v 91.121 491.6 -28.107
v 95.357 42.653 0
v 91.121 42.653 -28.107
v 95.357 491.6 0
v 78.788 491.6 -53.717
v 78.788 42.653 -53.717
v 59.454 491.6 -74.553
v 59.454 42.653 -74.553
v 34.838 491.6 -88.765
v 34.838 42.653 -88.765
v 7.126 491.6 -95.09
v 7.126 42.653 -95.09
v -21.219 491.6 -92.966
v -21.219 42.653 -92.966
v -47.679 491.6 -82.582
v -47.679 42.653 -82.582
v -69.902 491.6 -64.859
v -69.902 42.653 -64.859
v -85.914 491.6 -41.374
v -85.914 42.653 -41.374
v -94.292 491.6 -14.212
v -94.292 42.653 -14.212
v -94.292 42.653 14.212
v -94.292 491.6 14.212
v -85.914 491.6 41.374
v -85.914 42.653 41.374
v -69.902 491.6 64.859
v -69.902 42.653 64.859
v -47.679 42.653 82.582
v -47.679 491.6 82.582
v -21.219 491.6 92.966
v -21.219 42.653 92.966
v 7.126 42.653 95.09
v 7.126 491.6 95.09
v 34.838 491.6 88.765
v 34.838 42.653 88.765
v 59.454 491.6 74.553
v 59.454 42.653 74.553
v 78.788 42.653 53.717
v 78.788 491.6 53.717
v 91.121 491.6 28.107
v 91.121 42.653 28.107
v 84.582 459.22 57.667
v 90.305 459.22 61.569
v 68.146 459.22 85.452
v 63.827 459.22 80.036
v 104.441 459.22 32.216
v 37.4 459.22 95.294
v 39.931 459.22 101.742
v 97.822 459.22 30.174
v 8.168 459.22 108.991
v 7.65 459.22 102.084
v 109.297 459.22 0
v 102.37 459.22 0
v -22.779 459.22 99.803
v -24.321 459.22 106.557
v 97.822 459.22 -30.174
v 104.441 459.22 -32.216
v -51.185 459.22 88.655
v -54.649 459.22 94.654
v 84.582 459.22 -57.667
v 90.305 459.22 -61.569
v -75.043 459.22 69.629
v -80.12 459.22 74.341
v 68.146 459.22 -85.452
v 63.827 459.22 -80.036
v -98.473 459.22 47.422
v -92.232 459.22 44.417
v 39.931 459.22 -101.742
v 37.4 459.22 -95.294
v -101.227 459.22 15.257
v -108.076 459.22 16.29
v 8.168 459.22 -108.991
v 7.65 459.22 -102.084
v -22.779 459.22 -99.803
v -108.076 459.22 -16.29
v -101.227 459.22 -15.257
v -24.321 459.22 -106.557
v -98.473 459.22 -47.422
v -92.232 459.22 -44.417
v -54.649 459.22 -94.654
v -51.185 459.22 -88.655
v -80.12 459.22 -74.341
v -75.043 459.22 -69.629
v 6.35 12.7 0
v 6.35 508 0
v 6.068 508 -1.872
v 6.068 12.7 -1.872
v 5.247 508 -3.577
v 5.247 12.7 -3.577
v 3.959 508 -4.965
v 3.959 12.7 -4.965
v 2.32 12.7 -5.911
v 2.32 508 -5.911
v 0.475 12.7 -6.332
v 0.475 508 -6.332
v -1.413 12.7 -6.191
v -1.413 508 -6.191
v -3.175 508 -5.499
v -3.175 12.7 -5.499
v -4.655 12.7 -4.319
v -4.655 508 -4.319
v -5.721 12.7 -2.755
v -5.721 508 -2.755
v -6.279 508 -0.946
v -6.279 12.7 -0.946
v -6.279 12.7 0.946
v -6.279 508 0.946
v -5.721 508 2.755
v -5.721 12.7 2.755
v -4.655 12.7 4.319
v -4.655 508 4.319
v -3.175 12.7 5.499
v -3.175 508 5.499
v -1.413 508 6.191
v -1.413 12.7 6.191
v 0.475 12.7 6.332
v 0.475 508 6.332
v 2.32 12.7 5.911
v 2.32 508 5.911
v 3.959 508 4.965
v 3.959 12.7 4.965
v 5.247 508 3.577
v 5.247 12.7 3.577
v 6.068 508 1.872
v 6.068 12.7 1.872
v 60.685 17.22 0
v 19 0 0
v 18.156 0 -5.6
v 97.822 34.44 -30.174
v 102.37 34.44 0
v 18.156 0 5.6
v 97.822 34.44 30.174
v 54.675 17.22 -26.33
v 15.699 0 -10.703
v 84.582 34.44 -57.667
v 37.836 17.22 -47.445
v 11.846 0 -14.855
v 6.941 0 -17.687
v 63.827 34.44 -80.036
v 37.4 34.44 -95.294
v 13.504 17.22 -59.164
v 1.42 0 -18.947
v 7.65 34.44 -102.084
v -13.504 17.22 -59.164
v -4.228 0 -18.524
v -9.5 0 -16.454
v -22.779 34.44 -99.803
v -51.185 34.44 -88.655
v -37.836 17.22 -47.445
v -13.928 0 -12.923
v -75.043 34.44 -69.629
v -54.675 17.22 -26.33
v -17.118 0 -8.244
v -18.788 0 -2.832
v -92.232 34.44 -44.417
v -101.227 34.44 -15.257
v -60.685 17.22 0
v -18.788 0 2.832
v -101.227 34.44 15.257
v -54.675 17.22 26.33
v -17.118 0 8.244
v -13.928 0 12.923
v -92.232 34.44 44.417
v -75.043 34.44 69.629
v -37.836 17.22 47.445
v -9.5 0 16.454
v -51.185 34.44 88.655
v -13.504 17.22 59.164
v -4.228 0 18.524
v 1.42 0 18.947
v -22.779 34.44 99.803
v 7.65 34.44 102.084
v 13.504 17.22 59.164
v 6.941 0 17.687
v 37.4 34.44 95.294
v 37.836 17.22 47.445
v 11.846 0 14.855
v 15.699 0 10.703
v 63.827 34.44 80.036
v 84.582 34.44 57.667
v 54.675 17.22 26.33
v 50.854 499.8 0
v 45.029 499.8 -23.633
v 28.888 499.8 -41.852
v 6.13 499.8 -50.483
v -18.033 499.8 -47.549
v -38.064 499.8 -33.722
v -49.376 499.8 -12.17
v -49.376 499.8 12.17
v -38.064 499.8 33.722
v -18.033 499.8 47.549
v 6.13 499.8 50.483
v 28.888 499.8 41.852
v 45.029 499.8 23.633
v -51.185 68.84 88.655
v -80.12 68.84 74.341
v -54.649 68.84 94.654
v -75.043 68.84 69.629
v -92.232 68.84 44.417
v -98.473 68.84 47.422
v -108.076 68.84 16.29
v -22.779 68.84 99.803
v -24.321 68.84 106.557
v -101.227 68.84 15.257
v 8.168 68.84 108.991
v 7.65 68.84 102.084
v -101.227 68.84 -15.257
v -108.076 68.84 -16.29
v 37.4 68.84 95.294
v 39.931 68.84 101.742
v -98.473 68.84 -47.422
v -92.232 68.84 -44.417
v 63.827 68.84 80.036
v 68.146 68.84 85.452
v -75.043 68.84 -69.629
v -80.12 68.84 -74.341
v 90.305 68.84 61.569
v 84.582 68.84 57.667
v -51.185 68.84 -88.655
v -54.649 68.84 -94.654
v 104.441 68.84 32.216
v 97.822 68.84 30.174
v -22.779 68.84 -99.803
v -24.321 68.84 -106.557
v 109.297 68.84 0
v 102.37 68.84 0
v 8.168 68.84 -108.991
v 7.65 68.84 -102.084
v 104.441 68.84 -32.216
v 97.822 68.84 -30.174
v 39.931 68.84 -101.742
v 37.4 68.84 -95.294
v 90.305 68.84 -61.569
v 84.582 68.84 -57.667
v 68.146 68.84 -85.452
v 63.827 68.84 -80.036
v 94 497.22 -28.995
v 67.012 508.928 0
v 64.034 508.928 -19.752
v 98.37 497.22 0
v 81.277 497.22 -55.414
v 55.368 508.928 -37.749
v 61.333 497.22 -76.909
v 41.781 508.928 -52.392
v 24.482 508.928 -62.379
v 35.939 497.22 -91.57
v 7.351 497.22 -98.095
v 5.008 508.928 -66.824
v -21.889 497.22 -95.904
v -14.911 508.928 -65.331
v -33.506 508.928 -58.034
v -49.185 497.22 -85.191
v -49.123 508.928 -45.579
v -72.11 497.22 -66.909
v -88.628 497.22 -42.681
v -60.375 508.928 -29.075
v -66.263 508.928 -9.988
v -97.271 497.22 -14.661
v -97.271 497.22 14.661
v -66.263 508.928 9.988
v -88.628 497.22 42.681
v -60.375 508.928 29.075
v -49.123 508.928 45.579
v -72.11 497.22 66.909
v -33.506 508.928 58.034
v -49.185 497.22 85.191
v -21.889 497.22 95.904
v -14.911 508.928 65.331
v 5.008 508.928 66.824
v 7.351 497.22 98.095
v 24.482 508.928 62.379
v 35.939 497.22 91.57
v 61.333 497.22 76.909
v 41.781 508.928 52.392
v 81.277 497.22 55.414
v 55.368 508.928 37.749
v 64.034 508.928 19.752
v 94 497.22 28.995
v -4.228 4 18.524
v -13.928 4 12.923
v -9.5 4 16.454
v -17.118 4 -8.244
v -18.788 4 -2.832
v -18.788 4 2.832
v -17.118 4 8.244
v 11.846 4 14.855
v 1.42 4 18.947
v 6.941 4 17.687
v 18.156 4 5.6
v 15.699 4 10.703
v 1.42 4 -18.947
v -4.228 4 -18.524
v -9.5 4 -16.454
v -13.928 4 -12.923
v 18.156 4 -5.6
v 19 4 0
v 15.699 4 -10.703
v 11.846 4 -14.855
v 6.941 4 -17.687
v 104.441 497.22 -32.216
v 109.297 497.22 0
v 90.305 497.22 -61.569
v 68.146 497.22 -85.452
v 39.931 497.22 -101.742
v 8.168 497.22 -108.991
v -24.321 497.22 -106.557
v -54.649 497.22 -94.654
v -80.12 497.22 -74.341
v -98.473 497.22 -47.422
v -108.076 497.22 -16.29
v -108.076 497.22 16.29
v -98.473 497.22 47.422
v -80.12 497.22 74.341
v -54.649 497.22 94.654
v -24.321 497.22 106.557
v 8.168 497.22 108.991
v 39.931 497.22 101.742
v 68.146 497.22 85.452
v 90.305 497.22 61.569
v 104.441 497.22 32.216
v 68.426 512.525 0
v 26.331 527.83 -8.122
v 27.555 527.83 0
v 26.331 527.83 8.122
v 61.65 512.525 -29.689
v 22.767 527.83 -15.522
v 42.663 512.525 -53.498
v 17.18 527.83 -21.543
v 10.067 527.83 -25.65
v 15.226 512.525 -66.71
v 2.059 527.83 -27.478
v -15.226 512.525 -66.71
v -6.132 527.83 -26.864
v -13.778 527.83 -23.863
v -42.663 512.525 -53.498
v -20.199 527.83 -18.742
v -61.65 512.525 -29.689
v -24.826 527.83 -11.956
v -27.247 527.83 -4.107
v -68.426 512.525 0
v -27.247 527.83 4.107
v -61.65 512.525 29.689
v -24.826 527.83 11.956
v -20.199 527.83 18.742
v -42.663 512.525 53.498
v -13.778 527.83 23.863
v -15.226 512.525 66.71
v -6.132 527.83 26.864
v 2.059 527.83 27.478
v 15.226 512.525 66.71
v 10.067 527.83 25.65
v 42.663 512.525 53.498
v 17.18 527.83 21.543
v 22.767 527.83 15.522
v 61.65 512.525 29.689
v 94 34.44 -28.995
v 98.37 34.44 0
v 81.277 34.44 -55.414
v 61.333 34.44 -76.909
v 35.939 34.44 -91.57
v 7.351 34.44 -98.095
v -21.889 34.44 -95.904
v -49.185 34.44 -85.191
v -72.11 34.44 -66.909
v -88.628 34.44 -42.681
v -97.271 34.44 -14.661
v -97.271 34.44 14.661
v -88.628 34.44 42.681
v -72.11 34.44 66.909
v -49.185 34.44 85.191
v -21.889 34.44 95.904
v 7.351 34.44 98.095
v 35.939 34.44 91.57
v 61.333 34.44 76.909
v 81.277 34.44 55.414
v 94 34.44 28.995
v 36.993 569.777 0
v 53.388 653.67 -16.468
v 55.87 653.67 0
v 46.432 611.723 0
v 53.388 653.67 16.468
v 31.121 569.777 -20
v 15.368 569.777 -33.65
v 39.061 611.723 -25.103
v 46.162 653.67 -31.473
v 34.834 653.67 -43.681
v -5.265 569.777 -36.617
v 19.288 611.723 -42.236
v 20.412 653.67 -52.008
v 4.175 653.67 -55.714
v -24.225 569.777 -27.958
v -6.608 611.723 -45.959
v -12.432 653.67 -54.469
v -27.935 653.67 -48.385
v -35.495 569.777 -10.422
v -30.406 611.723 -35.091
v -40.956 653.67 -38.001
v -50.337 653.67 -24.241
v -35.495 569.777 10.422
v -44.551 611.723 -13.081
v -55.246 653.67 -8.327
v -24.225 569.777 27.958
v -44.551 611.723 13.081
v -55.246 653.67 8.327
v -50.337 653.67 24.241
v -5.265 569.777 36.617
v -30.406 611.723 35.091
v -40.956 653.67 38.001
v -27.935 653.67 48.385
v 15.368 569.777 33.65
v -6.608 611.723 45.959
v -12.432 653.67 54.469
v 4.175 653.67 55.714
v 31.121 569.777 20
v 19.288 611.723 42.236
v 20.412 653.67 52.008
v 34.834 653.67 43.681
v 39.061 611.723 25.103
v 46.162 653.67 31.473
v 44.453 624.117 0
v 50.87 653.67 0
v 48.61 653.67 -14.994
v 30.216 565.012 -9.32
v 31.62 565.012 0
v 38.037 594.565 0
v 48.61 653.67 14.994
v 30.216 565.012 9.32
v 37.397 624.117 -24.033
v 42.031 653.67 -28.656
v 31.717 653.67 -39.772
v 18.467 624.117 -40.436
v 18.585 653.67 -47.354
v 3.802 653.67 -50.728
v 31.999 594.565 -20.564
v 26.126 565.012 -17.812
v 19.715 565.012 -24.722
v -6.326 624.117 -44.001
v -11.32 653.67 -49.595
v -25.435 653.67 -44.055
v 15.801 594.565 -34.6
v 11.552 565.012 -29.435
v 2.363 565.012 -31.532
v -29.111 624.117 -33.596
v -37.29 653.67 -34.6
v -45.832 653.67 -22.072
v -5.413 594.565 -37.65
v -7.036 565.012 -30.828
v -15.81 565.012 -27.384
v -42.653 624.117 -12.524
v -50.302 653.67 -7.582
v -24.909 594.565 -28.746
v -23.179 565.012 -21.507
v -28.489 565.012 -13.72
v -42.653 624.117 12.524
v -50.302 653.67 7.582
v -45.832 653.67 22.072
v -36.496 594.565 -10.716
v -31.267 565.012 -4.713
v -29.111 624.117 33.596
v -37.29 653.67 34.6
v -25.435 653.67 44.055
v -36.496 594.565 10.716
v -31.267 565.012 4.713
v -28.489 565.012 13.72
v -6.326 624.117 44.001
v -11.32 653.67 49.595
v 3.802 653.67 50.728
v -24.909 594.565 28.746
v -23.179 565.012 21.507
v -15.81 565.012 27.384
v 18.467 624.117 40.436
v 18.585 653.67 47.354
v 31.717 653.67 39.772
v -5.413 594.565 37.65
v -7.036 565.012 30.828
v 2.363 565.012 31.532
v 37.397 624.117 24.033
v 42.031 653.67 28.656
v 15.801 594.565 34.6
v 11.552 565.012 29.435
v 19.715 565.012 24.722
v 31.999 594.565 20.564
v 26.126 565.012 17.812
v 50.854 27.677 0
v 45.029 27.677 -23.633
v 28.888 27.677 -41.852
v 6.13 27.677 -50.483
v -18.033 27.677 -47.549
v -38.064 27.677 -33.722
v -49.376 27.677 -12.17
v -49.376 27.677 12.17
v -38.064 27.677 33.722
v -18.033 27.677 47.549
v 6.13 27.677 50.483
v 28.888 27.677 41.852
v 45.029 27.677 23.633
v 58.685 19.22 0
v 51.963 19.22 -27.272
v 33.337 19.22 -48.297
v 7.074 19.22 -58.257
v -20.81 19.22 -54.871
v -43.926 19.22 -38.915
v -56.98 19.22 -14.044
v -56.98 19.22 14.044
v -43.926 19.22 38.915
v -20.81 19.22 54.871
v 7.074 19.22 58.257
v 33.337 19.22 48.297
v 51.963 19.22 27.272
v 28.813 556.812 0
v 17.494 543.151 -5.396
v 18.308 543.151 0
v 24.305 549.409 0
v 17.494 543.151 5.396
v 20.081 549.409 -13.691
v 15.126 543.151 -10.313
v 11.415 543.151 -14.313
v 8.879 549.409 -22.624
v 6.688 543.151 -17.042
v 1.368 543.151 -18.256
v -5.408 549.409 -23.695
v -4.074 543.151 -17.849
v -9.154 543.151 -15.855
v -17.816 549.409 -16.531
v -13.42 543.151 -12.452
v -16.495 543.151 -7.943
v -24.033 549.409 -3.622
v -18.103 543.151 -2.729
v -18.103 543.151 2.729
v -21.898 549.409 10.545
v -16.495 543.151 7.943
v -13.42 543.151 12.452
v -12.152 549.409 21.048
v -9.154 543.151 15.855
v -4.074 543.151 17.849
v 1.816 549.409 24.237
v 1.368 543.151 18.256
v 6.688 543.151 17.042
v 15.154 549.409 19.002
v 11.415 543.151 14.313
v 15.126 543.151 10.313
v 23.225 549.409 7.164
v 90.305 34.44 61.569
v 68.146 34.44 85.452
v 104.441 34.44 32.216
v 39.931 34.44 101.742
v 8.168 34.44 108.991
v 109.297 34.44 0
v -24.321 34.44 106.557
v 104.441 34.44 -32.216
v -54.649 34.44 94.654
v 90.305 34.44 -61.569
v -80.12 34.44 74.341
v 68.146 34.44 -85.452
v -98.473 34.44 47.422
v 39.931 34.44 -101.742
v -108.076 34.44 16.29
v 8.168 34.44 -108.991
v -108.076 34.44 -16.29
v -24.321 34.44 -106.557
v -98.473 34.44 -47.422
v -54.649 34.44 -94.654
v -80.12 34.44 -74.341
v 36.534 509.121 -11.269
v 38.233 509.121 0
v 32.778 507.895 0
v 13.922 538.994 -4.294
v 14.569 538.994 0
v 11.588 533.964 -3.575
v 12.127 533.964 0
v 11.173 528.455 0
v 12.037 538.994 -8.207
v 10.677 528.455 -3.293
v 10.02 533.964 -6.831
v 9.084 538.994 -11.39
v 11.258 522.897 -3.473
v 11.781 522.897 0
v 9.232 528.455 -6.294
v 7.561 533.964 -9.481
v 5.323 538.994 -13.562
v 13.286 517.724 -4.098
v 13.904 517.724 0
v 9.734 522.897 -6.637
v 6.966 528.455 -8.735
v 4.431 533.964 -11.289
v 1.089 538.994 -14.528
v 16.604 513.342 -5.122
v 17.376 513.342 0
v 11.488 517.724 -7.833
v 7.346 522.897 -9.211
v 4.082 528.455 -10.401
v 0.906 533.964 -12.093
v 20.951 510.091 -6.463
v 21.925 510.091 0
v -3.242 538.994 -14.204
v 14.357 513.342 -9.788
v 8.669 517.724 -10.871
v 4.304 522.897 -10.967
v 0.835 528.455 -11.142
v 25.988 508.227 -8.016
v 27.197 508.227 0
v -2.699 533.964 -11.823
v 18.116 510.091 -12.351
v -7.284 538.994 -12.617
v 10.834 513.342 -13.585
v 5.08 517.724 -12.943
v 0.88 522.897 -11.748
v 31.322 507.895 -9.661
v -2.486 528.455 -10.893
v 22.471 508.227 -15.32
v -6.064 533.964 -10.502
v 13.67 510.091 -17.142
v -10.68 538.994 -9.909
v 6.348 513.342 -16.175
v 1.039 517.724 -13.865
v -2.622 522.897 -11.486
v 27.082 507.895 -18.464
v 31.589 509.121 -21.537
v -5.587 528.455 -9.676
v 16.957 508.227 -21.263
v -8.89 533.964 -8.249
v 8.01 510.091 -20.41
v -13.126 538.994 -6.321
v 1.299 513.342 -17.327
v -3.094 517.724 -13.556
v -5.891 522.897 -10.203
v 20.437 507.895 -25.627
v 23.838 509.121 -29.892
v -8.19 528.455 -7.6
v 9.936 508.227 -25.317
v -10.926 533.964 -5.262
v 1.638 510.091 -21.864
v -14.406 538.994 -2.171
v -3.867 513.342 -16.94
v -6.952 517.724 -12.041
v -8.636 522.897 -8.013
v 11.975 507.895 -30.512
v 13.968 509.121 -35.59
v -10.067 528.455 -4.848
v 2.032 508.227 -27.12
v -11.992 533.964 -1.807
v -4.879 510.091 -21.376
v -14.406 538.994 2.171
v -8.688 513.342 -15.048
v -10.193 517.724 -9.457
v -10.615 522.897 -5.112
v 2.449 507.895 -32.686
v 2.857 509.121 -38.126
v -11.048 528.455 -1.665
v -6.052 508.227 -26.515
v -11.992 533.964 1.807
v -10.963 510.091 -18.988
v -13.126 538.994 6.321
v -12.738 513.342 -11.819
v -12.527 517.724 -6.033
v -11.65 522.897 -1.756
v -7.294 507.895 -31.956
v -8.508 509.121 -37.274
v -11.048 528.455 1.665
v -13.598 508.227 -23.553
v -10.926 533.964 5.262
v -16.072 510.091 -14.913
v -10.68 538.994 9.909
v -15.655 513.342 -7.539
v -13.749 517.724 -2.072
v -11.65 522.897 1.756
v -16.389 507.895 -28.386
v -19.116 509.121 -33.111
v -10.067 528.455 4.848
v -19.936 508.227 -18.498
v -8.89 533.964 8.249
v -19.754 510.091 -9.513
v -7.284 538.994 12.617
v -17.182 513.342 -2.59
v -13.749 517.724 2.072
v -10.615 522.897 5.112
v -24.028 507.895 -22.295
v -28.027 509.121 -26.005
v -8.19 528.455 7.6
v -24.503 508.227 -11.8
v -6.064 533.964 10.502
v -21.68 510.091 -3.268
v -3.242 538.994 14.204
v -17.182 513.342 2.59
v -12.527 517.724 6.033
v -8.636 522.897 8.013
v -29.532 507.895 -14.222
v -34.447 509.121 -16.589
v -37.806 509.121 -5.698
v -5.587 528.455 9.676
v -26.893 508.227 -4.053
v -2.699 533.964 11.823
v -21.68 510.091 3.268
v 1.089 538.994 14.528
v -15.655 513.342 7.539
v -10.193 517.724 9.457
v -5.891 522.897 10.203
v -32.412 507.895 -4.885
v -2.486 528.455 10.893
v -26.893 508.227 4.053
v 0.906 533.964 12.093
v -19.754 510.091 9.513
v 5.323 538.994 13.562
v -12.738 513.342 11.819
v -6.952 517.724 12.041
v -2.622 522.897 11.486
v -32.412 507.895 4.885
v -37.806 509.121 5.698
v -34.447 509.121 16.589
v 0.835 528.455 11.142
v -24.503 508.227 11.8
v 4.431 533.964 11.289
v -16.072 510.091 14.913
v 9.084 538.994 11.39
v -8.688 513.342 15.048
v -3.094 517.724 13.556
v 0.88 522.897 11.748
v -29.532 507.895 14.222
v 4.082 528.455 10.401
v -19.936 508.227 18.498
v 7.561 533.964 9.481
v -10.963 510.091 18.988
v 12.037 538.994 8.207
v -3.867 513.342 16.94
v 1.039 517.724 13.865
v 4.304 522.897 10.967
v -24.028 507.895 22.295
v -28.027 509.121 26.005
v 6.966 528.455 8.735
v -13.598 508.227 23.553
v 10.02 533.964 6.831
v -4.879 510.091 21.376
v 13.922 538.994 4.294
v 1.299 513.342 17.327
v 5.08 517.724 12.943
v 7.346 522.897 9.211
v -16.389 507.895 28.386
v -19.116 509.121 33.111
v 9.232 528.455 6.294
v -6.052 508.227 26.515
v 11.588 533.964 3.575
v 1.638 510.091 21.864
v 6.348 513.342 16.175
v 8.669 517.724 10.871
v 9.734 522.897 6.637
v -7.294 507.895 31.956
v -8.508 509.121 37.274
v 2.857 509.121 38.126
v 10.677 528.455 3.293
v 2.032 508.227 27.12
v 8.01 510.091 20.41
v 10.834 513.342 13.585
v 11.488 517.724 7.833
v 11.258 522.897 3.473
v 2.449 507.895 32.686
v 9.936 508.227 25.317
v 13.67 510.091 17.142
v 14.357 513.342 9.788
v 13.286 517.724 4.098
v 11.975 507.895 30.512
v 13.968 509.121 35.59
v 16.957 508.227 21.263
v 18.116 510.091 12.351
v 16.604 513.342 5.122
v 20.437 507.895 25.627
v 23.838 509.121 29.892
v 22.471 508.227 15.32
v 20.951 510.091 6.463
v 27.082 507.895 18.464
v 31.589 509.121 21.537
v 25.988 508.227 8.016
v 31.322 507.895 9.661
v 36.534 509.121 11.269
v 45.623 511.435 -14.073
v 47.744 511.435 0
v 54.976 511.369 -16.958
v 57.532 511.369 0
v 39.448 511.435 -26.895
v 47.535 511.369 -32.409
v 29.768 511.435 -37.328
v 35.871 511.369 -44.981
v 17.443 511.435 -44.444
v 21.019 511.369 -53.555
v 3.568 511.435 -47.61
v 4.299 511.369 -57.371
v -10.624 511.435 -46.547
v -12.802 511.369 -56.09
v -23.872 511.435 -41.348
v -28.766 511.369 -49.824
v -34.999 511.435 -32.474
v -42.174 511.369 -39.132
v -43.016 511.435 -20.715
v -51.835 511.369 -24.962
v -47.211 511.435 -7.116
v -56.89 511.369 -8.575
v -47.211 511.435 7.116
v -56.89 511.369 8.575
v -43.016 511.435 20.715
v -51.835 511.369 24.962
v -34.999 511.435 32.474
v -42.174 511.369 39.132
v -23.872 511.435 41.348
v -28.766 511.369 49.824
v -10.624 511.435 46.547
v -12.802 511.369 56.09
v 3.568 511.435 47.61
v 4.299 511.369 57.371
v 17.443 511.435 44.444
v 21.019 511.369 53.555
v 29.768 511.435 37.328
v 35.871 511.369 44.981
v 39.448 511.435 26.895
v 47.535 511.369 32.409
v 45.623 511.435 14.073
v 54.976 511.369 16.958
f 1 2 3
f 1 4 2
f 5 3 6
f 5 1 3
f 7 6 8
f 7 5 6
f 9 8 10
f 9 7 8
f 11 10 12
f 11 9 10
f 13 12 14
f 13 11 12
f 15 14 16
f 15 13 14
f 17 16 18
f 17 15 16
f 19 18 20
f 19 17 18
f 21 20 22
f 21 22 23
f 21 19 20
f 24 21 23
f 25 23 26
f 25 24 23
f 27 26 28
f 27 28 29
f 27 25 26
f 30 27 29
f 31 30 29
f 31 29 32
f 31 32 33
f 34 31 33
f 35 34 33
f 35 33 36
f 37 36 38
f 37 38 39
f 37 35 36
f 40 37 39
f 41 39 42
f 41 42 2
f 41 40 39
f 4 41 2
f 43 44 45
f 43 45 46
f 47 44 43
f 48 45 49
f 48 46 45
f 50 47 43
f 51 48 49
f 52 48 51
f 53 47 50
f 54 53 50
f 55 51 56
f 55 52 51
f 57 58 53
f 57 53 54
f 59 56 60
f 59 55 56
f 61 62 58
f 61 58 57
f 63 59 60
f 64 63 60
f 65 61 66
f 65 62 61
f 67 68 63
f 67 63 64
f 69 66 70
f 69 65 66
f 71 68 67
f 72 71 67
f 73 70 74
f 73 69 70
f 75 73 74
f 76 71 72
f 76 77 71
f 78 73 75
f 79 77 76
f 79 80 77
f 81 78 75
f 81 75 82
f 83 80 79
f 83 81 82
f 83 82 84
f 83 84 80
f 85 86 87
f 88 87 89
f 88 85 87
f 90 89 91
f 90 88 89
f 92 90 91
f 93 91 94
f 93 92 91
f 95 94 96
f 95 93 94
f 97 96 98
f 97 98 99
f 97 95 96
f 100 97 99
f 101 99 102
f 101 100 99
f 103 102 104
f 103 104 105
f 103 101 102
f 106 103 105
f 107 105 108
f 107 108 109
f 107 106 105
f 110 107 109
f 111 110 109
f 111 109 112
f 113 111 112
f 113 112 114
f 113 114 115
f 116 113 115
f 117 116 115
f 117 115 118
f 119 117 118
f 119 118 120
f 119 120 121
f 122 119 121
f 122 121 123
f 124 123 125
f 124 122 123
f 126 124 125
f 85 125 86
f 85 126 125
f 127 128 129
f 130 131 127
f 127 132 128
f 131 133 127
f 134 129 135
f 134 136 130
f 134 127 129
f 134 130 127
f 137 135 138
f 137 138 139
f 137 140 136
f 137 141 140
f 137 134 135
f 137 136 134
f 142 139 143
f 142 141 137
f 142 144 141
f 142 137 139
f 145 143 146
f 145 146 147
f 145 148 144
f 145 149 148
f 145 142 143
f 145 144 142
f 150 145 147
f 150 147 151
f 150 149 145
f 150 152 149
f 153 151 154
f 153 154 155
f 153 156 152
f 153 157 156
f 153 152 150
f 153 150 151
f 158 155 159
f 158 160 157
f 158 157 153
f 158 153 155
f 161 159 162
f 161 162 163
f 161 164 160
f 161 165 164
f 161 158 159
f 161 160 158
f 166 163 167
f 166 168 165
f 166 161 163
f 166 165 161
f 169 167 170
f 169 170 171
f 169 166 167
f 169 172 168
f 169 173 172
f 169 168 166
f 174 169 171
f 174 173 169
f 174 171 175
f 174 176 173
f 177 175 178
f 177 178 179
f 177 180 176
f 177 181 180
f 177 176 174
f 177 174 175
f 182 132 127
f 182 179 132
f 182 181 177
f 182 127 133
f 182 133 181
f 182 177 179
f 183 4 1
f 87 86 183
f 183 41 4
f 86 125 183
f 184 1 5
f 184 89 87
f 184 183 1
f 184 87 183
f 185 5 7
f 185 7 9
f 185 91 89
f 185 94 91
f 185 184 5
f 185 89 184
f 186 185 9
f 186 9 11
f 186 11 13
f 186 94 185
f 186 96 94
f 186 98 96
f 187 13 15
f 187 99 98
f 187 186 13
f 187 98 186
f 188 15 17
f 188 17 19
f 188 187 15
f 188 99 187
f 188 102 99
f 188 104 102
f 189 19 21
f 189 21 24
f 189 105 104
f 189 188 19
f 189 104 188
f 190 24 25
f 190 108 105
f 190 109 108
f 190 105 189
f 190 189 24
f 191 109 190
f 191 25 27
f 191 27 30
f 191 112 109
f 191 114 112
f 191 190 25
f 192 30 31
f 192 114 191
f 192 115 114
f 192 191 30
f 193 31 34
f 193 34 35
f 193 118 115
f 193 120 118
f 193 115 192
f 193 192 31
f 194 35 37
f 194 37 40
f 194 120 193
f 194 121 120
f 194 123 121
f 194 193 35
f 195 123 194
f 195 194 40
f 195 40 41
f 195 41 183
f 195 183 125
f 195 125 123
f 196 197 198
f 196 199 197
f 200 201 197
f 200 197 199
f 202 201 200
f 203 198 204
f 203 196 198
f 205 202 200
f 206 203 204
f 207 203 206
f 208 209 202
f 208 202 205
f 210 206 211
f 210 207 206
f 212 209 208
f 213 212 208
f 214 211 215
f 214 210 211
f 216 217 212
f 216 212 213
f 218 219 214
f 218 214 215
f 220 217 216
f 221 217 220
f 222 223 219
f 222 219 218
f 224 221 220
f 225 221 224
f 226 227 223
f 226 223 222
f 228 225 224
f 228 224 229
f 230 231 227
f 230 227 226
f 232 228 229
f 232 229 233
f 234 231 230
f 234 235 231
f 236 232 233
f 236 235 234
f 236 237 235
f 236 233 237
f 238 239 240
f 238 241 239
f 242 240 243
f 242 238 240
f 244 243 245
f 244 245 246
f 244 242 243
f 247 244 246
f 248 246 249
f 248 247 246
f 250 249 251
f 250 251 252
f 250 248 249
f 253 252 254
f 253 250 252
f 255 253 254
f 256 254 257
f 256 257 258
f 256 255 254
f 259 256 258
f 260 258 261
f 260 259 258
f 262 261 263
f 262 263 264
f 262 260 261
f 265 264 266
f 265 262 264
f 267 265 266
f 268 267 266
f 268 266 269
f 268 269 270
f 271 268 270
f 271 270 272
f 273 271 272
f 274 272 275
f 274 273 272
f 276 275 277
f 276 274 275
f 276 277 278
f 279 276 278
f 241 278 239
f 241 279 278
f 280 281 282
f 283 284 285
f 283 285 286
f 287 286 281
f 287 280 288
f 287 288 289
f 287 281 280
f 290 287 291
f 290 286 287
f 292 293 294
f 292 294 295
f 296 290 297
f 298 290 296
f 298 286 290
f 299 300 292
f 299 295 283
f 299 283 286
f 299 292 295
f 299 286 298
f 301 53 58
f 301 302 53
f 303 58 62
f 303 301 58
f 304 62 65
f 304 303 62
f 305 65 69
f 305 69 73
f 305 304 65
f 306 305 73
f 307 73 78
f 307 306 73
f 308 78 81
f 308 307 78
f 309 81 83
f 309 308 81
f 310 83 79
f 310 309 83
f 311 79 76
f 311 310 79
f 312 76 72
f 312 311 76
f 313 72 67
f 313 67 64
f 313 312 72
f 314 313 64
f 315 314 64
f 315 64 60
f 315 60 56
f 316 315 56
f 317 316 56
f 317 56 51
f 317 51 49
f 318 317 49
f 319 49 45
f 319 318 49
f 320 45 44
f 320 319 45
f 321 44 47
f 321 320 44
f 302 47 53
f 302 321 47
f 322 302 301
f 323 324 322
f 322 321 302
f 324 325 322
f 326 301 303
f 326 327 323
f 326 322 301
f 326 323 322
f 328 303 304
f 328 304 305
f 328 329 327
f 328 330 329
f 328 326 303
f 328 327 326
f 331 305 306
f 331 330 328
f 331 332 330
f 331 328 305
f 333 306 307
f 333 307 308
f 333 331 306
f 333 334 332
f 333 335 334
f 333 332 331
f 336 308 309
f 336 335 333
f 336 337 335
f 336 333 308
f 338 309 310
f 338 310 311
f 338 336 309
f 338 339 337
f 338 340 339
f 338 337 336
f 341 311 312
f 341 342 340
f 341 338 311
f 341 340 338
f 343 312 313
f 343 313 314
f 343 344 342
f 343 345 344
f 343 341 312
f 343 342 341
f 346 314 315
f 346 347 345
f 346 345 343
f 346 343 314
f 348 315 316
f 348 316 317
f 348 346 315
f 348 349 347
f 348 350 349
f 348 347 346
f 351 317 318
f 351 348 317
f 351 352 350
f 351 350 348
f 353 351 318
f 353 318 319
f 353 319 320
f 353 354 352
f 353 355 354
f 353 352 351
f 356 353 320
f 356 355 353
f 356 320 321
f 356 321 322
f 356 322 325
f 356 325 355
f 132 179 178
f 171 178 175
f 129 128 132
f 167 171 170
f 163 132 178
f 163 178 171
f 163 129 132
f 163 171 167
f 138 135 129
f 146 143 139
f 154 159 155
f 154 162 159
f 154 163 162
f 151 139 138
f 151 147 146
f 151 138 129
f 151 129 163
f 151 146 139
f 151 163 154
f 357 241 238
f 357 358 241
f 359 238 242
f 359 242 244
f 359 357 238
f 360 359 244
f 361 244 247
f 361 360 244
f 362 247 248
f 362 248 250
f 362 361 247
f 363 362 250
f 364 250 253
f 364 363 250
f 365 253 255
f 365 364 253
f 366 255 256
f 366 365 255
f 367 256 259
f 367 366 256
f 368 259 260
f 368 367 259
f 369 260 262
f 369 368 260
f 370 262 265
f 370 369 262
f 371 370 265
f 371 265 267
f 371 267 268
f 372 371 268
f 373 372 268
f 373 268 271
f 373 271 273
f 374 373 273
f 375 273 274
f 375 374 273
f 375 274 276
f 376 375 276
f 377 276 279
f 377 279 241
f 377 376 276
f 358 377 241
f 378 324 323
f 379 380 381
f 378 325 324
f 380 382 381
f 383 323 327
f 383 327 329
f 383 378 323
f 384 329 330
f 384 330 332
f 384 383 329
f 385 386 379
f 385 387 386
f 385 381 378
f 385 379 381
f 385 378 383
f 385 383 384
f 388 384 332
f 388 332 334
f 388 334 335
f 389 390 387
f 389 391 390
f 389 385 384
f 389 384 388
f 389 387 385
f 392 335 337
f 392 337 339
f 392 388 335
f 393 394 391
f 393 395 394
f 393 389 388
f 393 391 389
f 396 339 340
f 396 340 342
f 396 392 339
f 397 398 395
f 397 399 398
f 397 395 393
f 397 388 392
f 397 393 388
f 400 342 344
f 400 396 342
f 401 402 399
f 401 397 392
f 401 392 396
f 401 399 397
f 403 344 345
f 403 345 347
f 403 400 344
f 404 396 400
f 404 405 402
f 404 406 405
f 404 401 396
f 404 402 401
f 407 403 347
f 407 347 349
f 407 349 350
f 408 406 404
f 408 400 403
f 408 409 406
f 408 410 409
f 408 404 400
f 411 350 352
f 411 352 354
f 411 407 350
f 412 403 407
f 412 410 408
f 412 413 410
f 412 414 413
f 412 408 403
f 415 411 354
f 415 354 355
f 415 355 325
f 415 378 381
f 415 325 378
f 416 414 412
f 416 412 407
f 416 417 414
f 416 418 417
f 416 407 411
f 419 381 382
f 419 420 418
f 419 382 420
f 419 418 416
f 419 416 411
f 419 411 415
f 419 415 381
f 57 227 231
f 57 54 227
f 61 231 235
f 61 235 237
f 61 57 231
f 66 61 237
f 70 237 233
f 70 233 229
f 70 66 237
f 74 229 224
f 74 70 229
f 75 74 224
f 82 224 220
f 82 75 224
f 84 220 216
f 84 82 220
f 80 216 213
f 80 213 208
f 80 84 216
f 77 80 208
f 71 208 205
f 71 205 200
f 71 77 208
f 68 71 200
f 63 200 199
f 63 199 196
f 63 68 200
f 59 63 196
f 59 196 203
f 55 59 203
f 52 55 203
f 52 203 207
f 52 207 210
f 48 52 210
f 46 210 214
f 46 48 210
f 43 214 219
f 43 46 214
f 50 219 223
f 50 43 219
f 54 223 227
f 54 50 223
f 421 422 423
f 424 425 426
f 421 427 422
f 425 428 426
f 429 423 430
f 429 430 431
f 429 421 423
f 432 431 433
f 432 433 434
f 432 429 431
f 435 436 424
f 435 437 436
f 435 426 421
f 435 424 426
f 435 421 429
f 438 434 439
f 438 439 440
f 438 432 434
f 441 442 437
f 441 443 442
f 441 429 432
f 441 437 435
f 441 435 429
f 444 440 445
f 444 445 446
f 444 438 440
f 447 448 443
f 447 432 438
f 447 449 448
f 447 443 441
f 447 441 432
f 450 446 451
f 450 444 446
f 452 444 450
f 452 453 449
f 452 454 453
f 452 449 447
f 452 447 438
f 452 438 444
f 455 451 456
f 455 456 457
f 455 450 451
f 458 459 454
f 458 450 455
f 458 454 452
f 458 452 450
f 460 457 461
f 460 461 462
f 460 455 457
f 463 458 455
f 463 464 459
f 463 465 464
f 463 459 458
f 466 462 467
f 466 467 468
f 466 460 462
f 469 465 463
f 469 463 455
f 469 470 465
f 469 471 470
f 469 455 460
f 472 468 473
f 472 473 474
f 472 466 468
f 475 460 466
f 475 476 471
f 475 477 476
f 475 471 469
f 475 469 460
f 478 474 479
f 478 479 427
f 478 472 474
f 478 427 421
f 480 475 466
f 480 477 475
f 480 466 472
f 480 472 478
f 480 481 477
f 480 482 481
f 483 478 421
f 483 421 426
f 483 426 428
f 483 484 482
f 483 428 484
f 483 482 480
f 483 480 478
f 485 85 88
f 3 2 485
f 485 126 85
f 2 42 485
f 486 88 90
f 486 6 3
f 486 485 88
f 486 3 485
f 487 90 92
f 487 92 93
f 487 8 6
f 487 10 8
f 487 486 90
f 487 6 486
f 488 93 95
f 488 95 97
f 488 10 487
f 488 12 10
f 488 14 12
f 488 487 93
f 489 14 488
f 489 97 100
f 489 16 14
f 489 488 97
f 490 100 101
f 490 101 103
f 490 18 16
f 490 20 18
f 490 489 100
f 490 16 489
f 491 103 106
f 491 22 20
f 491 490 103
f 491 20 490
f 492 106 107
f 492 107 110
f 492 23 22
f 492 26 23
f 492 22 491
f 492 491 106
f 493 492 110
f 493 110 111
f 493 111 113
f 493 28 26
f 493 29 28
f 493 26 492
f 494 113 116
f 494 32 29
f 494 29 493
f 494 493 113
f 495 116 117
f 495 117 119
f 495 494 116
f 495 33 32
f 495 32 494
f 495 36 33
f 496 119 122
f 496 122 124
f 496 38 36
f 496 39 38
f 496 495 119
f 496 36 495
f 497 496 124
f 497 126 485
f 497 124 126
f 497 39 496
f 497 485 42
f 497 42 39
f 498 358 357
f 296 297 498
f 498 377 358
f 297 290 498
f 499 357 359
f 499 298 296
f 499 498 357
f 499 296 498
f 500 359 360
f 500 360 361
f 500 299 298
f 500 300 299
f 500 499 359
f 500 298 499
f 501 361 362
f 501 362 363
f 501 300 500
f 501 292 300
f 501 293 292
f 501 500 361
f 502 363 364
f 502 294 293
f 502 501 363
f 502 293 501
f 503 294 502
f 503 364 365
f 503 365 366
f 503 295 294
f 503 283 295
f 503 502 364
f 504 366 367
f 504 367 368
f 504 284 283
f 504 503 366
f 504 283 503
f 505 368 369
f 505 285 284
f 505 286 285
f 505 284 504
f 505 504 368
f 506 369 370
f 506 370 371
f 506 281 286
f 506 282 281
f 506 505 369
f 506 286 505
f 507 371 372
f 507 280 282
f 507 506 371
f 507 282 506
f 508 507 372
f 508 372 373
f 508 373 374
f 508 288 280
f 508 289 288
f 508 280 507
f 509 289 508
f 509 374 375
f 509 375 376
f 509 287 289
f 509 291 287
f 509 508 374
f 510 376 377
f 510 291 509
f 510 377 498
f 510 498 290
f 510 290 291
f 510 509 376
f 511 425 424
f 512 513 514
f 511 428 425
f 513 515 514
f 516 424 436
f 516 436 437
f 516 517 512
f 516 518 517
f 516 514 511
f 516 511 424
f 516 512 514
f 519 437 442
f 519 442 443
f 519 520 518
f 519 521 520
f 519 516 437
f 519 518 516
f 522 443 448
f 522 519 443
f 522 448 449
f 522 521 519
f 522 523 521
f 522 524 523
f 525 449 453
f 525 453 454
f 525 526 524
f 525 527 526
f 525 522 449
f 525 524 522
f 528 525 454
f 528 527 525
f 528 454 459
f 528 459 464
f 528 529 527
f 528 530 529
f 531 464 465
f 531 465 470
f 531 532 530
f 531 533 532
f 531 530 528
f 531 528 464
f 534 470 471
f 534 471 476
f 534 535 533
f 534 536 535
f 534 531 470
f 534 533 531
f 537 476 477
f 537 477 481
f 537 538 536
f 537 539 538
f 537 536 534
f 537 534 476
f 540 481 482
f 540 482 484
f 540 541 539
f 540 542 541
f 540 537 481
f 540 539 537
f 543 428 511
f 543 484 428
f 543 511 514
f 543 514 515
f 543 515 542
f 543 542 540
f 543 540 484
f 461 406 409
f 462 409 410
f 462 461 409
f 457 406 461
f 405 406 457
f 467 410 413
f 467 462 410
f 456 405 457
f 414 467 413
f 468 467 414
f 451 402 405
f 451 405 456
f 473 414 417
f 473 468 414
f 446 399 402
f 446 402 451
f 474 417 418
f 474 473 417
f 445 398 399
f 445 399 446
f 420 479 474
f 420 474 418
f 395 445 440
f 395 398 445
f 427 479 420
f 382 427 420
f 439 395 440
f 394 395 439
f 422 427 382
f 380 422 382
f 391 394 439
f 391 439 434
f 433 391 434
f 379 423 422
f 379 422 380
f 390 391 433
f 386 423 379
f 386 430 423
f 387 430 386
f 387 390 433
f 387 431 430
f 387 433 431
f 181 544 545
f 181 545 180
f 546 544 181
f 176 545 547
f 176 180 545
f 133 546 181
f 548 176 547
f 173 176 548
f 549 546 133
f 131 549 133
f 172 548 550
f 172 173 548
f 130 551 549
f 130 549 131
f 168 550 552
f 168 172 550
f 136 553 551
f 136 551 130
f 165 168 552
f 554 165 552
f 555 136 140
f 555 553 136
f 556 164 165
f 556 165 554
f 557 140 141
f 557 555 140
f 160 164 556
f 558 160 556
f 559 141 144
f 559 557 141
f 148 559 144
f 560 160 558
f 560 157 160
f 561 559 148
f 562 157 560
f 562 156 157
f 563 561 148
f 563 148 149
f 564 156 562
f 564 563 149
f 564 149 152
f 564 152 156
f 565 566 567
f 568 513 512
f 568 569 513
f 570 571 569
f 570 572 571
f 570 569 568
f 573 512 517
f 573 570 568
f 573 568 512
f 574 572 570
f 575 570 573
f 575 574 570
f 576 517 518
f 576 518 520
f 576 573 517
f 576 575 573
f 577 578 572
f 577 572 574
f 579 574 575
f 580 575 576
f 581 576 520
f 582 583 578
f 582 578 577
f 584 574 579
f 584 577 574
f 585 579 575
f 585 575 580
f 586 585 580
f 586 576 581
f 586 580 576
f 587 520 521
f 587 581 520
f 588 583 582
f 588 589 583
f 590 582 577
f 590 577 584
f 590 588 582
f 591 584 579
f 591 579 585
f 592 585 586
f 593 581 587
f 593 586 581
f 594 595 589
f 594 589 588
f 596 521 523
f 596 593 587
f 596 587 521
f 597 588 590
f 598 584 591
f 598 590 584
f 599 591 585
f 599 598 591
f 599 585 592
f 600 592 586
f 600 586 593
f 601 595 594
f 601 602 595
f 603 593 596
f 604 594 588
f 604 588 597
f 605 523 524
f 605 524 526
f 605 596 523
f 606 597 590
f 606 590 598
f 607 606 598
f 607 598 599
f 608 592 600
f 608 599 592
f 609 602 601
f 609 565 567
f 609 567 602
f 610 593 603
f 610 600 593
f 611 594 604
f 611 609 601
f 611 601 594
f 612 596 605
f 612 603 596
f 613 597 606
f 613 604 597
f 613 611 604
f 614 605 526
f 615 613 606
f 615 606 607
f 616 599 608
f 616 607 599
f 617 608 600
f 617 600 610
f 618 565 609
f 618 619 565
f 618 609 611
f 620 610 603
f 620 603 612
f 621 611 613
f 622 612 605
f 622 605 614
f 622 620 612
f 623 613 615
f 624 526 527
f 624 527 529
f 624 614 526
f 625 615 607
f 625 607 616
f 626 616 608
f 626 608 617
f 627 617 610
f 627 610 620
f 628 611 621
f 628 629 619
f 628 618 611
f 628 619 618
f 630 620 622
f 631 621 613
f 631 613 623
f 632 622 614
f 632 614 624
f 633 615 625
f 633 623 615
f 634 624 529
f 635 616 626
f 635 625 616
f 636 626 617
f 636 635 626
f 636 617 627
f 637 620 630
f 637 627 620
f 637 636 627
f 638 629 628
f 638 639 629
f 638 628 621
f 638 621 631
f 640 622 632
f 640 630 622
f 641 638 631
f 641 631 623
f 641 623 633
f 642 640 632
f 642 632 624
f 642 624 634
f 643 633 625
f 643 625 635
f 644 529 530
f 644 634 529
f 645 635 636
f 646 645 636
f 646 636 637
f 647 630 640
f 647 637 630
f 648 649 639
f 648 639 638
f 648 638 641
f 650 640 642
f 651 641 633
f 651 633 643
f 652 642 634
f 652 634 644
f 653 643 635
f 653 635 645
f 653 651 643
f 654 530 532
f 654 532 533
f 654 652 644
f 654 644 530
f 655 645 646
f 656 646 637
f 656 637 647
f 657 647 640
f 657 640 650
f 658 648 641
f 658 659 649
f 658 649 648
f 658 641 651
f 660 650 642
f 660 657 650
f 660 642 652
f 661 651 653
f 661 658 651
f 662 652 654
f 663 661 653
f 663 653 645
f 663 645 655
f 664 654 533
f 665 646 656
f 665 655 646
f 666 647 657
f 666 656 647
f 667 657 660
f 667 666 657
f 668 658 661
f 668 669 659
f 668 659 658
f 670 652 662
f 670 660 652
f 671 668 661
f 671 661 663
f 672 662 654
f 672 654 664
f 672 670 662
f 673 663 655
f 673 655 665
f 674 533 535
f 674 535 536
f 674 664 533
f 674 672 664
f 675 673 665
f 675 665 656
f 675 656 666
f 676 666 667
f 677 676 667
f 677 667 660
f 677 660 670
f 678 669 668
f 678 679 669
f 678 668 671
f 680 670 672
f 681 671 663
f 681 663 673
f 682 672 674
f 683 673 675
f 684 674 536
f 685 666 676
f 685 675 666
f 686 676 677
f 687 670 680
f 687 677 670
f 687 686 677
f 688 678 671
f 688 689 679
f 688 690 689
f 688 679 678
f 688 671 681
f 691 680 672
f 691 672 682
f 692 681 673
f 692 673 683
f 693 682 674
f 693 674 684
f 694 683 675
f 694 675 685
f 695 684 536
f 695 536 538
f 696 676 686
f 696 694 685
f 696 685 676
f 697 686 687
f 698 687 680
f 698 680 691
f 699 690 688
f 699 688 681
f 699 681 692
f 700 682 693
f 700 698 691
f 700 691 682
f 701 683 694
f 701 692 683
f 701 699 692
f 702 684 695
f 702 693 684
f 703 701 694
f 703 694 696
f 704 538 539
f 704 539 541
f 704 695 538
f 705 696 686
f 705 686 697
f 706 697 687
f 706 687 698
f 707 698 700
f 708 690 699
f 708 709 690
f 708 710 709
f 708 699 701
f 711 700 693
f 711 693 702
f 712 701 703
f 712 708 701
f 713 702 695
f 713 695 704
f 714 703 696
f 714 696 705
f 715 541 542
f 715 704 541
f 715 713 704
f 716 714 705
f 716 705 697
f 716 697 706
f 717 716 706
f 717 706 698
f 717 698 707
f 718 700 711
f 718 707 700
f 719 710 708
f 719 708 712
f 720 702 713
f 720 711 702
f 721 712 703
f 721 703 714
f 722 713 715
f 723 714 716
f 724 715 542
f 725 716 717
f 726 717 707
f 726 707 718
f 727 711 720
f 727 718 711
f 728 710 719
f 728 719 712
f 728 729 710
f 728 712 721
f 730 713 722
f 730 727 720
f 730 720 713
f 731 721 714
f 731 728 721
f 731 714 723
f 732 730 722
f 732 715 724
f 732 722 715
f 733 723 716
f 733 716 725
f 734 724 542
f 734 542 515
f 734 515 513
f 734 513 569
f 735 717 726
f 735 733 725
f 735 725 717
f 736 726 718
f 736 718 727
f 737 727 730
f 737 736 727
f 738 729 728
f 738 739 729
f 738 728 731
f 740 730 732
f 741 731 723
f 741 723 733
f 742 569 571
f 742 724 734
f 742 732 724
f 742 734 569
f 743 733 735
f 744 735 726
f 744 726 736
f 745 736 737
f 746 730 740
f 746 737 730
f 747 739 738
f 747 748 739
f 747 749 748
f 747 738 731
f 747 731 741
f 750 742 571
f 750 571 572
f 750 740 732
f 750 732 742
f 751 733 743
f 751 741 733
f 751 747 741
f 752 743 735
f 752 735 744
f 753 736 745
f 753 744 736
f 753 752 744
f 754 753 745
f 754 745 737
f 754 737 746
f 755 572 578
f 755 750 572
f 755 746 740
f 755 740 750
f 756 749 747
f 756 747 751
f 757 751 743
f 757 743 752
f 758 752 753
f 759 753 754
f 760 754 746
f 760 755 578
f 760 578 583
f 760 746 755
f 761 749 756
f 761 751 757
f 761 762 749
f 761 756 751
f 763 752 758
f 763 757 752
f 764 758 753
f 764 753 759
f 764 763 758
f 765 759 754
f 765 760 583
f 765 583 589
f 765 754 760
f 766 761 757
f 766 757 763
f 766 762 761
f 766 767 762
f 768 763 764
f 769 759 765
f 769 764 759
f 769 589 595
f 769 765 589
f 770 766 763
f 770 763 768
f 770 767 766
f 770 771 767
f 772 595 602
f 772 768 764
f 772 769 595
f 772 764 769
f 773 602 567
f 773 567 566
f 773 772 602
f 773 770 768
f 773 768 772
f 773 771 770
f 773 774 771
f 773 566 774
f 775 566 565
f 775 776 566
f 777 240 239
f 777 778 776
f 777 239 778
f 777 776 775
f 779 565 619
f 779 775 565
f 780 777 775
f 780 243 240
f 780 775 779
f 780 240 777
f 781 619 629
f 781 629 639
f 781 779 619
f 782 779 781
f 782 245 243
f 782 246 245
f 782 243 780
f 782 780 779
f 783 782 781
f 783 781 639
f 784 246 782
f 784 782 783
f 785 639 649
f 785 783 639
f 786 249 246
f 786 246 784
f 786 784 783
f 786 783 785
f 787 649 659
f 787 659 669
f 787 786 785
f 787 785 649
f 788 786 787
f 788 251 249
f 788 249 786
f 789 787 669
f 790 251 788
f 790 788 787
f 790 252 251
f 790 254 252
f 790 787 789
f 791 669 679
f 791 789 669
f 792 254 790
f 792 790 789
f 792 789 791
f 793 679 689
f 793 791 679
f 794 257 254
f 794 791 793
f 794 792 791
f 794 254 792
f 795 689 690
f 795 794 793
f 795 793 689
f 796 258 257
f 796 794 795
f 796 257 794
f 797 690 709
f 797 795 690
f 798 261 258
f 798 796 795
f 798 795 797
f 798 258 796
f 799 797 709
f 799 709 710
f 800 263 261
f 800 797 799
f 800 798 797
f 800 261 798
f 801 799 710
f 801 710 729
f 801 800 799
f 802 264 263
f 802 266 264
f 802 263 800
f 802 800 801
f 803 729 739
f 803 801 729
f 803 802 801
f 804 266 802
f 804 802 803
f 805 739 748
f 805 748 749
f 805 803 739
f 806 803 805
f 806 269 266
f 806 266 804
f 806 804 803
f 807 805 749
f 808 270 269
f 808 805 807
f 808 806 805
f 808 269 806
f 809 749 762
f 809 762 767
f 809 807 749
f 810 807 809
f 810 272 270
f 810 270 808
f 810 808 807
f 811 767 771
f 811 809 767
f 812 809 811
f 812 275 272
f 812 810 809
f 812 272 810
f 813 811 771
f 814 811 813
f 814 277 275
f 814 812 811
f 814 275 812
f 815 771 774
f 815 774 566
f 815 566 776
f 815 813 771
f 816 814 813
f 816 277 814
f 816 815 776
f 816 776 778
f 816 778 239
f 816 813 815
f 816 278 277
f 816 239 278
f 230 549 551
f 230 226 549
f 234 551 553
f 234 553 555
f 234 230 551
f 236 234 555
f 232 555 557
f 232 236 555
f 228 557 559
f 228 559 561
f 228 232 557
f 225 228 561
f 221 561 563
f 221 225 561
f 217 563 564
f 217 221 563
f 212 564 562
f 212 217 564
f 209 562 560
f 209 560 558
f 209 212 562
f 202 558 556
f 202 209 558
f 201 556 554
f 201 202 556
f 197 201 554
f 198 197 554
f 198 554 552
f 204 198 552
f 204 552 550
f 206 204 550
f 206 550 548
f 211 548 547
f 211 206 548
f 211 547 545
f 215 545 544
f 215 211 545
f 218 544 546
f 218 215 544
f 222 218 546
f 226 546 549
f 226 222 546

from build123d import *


with BuildPart() as part:
    # Sketch1 → Revolve1 (revolve)
    with BuildSketch(Plane.XY):
        with BuildLine():
            Line((0, 0), (19, 0))
            Line((19, 0), (102.37, 34.44))
            Line((102.37, 34.44), (109.297, 34.44))
            Line((109.297, 34.44), (109.297, 68.84))
            Line((109.297, 68.84), (102.37, 68.84))
            Line((102.37, 68.84), (102.37, 459.22))
            Line((102.37, 459.22), (109.297, 459.22))
            Line((109.297, 459.22), (109.297, 497.22))
            Line((109.297, 497.22), (27.555, 527.83))
            Line((27.555, 527.83), (55.87, 653.67))
            Line((55.87, 653.67), (50.87, 653.67))
            Line((50.87, 653.67), (31.620367249, 565.011883615))
            ThreePointArc((31.620367249, 565.011883615), (26.759732281, 552.987802652), (18.307547806, 543.150888862))
            ThreePointArc((18.307547806, 543.150888862), (13.904223764, 517.724343789), (38.232880309, 509.121150911))
            ThreePointArc((38.232880309, 509.121150911), (52.640140443, 511.702554255), (67.01150326, 508.928258207))
            Line((67.01150326, 508.928258207), (98.37, 497.22))
            Line((98.37, 497.22), (98.37, 34.44))
            Line((98.37, 34.44), (19, 4))
            Line((19, 4), (0, 4))
            Line((0, 4), (0, 0))
        make_face()
        Polygon((6.35, 12.7), (95.357036741, 42.653116777), (95.357036741, 491.600448224), (6.35, 508), align=None)
    revolve(axis=Axis((0, 0, 0), (0, 1, 0)))


solid = part.part
